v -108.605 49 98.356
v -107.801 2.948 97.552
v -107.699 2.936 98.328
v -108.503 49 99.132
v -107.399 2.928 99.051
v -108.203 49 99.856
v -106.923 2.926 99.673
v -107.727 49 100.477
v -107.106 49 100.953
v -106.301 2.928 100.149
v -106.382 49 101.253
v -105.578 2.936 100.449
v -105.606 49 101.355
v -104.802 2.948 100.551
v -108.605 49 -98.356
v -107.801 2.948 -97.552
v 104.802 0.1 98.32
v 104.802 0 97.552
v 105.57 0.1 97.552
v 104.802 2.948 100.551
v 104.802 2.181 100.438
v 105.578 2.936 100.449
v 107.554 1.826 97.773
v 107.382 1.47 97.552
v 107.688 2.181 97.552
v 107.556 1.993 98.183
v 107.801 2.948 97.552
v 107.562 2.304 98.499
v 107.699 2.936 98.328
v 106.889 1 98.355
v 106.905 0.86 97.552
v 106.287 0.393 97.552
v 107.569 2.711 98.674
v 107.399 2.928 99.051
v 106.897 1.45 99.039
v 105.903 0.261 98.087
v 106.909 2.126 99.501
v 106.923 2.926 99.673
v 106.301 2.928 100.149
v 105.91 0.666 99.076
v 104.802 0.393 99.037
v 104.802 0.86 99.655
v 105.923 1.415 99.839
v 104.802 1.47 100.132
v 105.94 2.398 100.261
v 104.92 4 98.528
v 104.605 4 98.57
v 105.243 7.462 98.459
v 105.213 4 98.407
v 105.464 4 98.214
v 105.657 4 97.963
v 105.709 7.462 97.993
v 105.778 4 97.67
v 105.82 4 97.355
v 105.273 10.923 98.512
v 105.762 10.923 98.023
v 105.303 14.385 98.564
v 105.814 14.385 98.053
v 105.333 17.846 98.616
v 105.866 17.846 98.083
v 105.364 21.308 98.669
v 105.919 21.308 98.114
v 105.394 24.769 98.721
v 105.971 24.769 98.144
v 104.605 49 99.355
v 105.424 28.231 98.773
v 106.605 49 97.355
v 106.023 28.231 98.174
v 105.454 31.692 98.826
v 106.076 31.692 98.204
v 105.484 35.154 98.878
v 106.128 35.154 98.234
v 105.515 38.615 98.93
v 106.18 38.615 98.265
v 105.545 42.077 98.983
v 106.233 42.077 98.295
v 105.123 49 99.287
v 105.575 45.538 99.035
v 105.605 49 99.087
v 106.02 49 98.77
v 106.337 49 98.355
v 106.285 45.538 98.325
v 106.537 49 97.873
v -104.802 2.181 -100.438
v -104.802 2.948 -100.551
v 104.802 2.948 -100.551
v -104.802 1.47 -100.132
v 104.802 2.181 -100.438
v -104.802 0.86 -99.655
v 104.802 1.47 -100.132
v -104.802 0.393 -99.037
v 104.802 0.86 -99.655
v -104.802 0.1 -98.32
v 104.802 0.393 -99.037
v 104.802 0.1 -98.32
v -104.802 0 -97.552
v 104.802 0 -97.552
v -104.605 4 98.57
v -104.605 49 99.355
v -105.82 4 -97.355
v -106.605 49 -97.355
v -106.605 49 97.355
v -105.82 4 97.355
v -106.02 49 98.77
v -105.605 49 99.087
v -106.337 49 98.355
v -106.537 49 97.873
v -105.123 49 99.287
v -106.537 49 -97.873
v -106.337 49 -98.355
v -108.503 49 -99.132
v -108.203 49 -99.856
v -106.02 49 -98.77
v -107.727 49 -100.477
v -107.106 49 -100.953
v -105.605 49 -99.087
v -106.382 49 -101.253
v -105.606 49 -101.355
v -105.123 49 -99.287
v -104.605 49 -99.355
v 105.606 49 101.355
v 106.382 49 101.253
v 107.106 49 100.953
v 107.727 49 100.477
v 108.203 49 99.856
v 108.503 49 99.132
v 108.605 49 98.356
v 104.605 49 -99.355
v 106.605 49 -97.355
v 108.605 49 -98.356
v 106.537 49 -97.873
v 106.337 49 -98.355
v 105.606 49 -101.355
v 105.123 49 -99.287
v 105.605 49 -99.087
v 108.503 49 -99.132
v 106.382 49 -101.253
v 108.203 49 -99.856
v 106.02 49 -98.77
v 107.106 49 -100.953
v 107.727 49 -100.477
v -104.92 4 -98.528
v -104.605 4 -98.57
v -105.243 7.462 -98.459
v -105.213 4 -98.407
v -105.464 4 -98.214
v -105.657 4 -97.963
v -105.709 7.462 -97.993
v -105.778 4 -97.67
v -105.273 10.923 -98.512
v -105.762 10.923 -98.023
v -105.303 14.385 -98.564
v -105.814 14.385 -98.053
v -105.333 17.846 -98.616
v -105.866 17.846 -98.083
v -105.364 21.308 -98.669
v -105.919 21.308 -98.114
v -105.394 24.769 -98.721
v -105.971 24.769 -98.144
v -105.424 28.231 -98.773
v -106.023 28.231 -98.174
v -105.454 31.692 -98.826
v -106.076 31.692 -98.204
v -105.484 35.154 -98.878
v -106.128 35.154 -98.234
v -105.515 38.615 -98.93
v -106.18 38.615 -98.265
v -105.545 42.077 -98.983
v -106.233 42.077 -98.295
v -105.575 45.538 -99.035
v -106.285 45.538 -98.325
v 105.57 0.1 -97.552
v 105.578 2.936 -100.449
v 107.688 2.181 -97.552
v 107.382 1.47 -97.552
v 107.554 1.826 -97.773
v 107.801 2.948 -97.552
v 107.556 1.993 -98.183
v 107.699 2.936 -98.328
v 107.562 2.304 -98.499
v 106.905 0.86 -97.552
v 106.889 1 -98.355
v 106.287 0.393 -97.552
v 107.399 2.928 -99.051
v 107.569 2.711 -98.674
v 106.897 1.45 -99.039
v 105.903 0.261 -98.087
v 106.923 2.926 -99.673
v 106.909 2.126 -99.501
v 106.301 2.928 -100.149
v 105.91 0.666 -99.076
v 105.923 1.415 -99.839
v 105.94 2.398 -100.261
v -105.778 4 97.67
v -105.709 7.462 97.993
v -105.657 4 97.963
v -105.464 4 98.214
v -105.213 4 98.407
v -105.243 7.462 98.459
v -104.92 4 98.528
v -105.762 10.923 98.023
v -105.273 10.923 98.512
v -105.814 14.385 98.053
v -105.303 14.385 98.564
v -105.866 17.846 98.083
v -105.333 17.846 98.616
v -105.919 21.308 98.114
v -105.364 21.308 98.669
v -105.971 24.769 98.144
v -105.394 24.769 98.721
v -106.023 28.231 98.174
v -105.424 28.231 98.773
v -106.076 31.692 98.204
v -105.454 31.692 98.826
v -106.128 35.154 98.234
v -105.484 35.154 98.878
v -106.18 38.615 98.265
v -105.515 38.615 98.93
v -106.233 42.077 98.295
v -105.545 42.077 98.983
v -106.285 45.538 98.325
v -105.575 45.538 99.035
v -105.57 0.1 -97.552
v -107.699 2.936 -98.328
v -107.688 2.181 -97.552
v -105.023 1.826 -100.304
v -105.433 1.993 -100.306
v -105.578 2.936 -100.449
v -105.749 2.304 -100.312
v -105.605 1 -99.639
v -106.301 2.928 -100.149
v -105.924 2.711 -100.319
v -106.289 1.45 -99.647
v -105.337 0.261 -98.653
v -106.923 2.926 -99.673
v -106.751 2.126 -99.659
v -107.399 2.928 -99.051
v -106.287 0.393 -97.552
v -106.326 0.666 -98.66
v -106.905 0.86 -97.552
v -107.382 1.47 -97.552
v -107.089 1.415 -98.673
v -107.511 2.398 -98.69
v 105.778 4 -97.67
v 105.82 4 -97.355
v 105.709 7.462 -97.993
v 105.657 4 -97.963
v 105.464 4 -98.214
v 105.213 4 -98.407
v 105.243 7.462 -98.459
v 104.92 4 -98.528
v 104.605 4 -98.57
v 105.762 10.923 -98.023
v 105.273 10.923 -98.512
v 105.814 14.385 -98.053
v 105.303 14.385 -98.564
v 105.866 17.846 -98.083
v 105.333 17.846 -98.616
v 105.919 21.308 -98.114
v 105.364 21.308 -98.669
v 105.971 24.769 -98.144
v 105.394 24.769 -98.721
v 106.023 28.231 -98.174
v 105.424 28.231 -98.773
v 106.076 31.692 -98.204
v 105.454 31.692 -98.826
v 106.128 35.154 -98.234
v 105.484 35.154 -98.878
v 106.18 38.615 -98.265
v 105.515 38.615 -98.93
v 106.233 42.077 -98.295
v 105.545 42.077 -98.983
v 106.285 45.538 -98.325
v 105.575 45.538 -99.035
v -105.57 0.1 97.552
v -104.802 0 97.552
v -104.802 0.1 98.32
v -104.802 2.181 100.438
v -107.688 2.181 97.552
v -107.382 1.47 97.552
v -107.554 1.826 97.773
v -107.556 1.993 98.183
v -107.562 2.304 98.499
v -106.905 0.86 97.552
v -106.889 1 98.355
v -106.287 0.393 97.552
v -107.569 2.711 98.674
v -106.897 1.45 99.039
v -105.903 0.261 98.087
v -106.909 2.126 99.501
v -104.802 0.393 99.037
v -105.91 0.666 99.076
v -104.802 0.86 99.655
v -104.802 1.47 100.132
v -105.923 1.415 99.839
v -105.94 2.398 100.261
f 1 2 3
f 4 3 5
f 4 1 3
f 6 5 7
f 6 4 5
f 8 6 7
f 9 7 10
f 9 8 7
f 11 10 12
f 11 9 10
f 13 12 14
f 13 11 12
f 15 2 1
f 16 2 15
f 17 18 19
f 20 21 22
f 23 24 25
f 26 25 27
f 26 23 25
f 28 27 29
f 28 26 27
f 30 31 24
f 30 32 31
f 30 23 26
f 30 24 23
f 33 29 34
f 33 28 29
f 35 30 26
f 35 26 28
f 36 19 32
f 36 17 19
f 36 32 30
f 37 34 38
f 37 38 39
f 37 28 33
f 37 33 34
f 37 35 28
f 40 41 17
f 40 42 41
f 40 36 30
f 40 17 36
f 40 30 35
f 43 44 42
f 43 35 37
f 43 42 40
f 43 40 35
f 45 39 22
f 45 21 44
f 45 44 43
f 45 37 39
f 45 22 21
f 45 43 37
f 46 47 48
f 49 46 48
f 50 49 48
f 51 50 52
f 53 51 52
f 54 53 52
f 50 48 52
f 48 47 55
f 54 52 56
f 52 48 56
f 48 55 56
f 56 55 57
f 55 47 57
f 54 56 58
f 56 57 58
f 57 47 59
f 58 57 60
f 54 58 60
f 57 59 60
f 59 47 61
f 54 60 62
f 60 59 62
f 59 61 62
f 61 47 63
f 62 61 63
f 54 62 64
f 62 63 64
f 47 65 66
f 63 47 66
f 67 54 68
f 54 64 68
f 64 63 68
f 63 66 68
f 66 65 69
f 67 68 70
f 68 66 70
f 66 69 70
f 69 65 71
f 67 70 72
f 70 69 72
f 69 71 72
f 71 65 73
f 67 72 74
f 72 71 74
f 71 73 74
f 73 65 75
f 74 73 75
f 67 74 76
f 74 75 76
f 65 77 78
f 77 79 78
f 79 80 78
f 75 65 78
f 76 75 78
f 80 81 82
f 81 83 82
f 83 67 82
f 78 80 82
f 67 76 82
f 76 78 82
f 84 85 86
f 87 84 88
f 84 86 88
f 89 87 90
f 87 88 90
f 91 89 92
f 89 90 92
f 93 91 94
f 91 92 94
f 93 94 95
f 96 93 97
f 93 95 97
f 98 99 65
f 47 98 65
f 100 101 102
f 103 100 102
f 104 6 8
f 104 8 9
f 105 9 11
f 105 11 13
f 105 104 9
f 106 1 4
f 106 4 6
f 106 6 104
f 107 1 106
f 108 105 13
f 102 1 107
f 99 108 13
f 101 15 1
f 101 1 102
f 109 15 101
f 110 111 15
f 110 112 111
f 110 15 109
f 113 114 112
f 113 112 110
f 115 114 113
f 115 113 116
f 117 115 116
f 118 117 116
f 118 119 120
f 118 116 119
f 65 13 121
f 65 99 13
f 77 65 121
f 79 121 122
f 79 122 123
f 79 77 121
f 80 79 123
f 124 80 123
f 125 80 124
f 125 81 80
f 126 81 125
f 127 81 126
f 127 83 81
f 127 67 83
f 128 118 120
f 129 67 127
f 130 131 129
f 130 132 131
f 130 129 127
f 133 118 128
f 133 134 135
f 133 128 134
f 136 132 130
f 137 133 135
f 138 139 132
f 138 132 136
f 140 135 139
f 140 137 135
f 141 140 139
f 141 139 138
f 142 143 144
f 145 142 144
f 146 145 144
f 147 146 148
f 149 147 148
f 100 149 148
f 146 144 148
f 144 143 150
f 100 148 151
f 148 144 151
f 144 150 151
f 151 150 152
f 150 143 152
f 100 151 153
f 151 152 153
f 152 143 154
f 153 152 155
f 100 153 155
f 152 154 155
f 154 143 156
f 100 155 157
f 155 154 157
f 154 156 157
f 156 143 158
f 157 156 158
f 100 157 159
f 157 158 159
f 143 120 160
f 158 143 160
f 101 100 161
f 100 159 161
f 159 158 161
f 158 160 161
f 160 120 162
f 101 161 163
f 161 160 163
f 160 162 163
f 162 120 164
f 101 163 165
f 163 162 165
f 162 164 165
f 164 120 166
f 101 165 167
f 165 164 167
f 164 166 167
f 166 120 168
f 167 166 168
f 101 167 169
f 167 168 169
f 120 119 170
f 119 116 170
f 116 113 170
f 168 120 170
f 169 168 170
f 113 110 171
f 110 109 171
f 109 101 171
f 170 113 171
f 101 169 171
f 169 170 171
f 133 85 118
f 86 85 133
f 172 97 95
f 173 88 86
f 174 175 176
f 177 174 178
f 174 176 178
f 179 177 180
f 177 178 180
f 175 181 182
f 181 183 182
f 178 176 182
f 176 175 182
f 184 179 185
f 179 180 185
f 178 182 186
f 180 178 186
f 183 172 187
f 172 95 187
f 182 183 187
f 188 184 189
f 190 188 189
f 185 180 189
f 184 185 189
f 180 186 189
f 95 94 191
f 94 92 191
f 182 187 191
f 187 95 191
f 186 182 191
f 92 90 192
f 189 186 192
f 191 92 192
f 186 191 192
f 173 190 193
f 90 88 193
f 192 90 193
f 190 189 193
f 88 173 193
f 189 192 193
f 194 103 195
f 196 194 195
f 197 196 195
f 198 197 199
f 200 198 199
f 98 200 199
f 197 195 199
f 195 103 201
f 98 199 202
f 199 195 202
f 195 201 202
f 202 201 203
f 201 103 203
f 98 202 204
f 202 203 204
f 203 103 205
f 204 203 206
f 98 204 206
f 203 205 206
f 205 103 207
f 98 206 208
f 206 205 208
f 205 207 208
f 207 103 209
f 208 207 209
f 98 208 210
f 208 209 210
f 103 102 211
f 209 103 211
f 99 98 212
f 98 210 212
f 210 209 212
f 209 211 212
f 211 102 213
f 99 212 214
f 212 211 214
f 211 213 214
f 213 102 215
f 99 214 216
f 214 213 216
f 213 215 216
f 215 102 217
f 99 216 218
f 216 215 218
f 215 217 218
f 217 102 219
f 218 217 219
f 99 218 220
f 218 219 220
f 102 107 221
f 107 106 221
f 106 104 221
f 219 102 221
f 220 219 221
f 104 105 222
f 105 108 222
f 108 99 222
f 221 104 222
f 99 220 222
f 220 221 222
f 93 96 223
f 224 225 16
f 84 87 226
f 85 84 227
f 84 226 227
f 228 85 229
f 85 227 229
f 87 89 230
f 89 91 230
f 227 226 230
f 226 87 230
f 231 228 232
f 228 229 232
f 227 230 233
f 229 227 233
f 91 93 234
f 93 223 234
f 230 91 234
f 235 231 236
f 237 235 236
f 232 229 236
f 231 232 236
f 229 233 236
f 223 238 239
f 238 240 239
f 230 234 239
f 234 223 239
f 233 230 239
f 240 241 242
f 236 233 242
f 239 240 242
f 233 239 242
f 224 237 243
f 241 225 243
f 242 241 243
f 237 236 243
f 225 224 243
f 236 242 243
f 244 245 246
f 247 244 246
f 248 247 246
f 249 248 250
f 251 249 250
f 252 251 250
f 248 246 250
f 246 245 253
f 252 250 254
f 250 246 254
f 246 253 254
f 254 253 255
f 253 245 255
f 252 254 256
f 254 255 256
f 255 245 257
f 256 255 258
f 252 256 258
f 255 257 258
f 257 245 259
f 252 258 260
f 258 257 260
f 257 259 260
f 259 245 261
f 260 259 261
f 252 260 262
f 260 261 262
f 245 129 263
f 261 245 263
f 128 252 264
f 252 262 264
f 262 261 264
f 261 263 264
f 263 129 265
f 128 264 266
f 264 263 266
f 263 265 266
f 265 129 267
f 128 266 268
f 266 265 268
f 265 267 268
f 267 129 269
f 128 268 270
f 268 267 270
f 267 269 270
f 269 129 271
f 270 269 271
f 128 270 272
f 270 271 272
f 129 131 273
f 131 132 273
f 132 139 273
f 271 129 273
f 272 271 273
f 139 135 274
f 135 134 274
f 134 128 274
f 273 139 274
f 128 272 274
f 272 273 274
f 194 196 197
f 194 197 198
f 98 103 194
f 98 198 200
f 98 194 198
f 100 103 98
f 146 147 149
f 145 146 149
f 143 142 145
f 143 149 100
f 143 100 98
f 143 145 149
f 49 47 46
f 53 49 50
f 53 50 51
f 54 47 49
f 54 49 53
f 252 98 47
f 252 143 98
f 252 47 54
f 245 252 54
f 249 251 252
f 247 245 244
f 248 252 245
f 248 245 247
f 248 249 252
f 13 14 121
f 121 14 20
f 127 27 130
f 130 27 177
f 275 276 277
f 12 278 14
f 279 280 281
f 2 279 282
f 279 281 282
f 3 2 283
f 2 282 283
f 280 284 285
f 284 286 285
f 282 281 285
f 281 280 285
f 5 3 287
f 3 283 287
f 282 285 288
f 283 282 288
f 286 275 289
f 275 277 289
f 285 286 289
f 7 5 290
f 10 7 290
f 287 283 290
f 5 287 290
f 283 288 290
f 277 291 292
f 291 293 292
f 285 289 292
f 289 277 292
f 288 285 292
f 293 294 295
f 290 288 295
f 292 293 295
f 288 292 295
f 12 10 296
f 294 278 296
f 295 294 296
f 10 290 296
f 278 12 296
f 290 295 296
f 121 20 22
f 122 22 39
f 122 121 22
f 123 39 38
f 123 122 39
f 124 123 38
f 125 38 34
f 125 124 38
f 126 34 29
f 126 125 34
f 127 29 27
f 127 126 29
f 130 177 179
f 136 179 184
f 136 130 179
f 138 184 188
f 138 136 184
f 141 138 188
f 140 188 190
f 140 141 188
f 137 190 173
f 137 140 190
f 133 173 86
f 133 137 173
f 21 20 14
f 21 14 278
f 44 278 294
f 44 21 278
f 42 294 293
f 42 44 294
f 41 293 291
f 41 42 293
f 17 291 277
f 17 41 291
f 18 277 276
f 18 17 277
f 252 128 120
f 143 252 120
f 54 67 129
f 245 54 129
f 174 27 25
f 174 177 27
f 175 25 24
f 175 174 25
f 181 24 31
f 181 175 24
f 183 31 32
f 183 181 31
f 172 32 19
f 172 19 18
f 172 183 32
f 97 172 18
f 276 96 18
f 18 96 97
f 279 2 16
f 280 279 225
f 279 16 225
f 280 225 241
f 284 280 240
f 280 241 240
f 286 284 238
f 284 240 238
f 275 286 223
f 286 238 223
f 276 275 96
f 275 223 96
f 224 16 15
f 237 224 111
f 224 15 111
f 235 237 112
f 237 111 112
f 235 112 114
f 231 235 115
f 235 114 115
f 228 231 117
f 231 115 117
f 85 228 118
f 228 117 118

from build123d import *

# Parameters (mm, degrees)
SKETCH1_W           = 215.5
SKETCH1_H           = 201
BOSS_EXTRUDE1_DEPTH = 49
BOSS_EXTRUDE1_DRAFT = -1
FILLET1_R           = 3
CUT_EXTRUDE1_DEPTH  = 45
CUT_EXTRUDE1_DRAFT  = -1


with BuildPart() as part:
    # Sketch1 → Boss-Extrude1 (with draft: the straight prism first)
    with BuildSketch(Plane(origin=(0, 0, 0), x_dir=(1, 0, 0), z_dir=(0, 1, 0))):
        Rectangle(SKETCH1_W, SKETCH1_H)
    extrude(amount=BOSS_EXTRUDE1_DEPTH)
    # Boss-Extrude1: the draft: its side faces are tilted about the plane it starts from
    boss_extrude1_sides = [part.faces().sort_by_distance(p)[0] for p in [
        (0, 24.5, 100.5),
        (107.75, 24.5, 0),
        (0, 24.5, -100.5),
        (-107.75, 24.5, 0),
    ]]
    draft(boss_extrude1_sides, Plane(origin=(0, 0, 0), x_dir=(1, 0, 0), z_dir=(0, 1, 0)), BOSS_EXTRUDE1_DRAFT)

    # Fillet1
    fillet1_edges = [part.edges().sort_by_distance(p)[0] for p in [
        (0, 0, 100.5),
        (-107.75, 0, 0),
        (0, 0, -100.5),
        (107.75, 0, 0),
        (108.177649091, 24.5, 100.927649091),
        (-108.177649091, 24.5, 100.927649091),
        (-108.177649091, 24.5, -100.927649091),
        (108.177649091, 24.5, -100.927649091),
    ]]
    fillet(fillet1_edges, radius=FILLET1_R)


with BuildPart() as cut_extrude1_tool:
    # Sketch2 → Cut-Extrude1 (with draft: the straight prism first)
    with BuildSketch(Plane(origin=(0, 49, 0), x_dir=(1, 0, 0), z_dir=(0, 1, 0))):
        with BuildLine():
            Line((-104.605298181, -99.355298181), (104.605298181, -99.355298181))
            ThreePointArc((104.605298181, -99.355298181), (106.019511744, -98.769511744), (106.605298181, -97.355298181))
            Line((106.605298181, -97.355298181), (106.605298181, 97.355298181))
            ThreePointArc((106.605298181, 97.355298181), (106.019511744, 98.769511744), (104.605298181, 99.355298181))
            Line((104.605298181, 99.355298181), (-104.605298181, 99.355298181))
            ThreePointArc((-104.605298181, 99.355298181), (-106.019511744, 98.769511744), (-106.605298181, 97.355298181))
            Line((-106.605298181, 97.355298181), (-106.605298181, -97.355298181))
            ThreePointArc((-106.605298181, -97.355298181), (-106.019511744, -98.769511744), (-104.605298181, -99.355298181))
        make_face()
    extrude(amount=-CUT_EXTRUDE1_DEPTH)
    # Cut-Extrude1: the draft: its side faces are tilted about the plane it starts from
    cut_extrude1_sides = [cut_extrude1_tool.faces().sort_by_distance(p)[0] for p in [
        (0, 26.5, 99.355298181),
        (106.019511744, 26.5, 98.769511744),
        (106.605298181, 26.5, 0),
        (106.019511744, 26.5, -98.769511744),
        (0, 26.5, -99.355298181),
        (-106.019511744, 26.5, -98.769511744),
        (-106.605298181, 26.5, 0),
        (-106.019511744, 26.5, 98.769511744),
    ]]
    draft(cut_extrude1_sides, Plane(origin=(0, 49, 0), x_dir=(1, 0, 0), z_dir=(0, 1, 0)), CUT_EXTRUDE1_DRAFT)


with BuildPart() as part_1:
    add(part.part)

    # Cut-Extrude1: cut by cut_extrude1_tool
    add(cut_extrude1_tool.part, mode=Mode.SUBTRACT)


solid = part_1.part
